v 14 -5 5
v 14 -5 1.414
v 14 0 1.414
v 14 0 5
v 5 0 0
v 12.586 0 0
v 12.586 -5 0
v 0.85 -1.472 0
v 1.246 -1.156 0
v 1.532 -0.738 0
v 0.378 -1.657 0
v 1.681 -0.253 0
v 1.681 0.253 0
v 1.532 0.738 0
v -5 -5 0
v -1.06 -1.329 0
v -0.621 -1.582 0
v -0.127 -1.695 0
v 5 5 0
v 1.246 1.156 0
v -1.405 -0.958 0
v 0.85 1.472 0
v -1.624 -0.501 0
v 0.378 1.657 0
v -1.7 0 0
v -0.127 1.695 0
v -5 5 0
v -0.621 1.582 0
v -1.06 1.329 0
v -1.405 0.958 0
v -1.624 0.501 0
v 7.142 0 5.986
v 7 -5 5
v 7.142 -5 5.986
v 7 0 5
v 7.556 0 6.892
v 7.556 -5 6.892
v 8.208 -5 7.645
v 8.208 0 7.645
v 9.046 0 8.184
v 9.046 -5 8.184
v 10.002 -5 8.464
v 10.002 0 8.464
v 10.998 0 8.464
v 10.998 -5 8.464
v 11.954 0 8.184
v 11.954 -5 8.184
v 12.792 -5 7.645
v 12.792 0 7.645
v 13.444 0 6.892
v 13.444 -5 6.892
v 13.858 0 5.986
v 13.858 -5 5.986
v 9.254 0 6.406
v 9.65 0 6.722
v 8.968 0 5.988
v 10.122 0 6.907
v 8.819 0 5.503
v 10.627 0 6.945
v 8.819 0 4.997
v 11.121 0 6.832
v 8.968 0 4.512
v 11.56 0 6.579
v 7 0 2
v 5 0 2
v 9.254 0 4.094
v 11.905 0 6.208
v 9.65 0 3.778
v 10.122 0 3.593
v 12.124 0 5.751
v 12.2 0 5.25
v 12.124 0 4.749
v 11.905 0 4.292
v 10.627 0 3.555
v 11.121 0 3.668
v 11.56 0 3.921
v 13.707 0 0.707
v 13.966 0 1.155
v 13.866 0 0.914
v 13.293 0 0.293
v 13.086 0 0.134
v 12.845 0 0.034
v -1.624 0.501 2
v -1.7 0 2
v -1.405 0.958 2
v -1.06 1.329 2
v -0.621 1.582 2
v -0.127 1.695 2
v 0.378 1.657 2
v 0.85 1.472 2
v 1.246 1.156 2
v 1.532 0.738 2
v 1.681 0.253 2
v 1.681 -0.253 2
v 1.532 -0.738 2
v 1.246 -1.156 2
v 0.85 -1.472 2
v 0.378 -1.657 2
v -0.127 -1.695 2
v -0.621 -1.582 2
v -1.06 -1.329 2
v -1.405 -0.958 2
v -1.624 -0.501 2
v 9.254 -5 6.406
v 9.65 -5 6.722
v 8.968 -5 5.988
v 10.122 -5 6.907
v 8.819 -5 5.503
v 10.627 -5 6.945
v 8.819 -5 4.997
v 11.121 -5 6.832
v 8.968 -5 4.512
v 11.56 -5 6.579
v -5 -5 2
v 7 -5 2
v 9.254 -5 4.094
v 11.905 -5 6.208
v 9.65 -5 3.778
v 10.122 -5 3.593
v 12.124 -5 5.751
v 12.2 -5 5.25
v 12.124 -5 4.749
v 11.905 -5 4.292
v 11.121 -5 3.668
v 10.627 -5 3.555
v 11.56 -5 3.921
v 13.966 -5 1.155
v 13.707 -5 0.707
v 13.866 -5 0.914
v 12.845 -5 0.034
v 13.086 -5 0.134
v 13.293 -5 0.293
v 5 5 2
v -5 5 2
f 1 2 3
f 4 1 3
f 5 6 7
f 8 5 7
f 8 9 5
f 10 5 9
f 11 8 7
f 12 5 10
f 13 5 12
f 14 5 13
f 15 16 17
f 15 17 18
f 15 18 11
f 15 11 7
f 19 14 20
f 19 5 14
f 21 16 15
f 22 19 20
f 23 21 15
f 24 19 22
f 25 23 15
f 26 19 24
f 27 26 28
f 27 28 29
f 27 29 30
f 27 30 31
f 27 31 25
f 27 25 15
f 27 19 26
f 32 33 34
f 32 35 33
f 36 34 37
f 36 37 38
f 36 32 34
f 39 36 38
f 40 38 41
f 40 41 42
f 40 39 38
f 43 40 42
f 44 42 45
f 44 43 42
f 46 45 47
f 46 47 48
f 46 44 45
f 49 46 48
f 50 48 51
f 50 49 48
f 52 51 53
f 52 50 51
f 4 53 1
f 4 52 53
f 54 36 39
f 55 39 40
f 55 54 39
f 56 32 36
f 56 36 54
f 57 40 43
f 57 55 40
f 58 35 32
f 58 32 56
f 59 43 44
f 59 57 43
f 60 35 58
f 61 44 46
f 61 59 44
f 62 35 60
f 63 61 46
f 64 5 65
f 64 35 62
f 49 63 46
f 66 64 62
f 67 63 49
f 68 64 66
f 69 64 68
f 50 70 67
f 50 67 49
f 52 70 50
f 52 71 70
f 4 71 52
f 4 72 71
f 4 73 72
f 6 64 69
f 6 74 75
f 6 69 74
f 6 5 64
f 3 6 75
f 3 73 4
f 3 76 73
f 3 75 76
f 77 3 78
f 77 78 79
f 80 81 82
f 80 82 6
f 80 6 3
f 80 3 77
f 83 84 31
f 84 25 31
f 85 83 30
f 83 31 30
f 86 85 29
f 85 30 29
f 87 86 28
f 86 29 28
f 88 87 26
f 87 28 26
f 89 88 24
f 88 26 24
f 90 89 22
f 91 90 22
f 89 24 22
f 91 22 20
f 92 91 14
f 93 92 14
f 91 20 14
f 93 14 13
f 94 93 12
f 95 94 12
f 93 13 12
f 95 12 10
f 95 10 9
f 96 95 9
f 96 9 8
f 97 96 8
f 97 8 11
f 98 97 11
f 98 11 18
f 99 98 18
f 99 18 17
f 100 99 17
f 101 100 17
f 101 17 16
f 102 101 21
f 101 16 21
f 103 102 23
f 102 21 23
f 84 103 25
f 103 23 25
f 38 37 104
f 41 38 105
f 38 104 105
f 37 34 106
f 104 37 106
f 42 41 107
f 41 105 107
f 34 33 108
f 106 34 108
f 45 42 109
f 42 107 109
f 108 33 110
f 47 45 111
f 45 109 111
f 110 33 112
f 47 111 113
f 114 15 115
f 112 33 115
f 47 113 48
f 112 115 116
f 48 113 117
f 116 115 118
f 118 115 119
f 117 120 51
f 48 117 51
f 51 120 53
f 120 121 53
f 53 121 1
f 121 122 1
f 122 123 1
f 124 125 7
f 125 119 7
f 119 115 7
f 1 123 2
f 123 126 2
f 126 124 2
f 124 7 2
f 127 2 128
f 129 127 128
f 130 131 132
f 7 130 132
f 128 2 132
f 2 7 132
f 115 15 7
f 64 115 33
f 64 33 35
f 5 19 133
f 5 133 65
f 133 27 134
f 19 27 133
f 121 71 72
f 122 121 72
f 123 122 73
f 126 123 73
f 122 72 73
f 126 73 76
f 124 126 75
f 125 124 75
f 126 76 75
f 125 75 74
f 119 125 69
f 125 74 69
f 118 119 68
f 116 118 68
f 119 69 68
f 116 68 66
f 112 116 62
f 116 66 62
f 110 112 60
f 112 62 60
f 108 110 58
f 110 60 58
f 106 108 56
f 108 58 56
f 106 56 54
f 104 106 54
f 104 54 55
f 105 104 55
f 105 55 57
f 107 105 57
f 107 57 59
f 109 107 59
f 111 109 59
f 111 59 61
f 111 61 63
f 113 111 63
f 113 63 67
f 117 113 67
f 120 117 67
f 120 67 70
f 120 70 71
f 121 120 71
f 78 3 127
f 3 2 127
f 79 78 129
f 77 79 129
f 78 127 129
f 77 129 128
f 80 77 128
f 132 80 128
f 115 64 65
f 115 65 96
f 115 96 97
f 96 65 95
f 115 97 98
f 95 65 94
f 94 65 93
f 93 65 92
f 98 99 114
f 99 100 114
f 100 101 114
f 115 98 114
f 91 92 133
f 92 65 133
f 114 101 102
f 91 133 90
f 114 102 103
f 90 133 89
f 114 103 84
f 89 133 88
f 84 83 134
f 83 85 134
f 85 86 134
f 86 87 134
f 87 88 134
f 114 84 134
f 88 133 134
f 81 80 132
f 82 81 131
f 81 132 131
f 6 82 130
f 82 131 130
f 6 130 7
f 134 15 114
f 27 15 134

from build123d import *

# Parameters (mm, degrees)
ESTRUSIONE_ESTRUSIONE1_DEPTH = 2
SCHIZZO2_W                   = 7
SCHIZZO2_H                   = 5
ESTRUSIONE_ESTRUSIONE2_DEPTH = 6.5
FORO_PER_VITE_M3_1_D         = 3.4
FORO_PER_VITE_M3_1_DEPTH     = 2
FORO_PER_VITE_M3_1_TIP       = 1.021463052
FORO_PER_VITE_M3_2_D         = 3.4
RACCORDO1_RADIUS             = 3.5
RACCORDO1_LENGTH             = 5
SMUSSO1_SIZE                 = 1
RACCORDO2_R                  = 1


with BuildPart() as part:
    # Schizzo1 → Estrusione-Estrusione1 (new body)
    with BuildSketch(Plane.XY):
        Polygon((5, 5), (5, 0), (14, 0), (14, -5), (5, -5), (-5, -5), (-5, 5), align=None)
    extrude(amount=ESTRUSIONE_ESTRUSIONE1_DEPTH)

    # Schizzo2 → Estrusione-Estrusione2 (add)
    with BuildSketch(Plane.XY.offset(2)):
        with Locations((10.5, -2.5)):
            Rectangle(SCHIZZO2_W, SCHIZZO2_H)
    extrude(amount=ESTRUSIONE_ESTRUSIONE2_DEPTH)

    # Foro per Vite M3-1
    with Locations(Plane.XY.offset(2)):
        with Locations((0, 0)):
            Hole(FORO_PER_VITE_M3_1_D / 2, depth=FORO_PER_VITE_M3_1_DEPTH)
            with Locations((0, 0, -(FORO_PER_VITE_M3_1_DEPTH + FORO_PER_VITE_M3_1_TIP / 2))):  # 118° drill point
                Cone(0, FORO_PER_VITE_M3_1_D / 2, FORO_PER_VITE_M3_1_TIP, mode=Mode.SUBTRACT)

    # Foro per Vite M3-2 (through all)
    with Locations(Plane(origin=(0, -5, 0), x_dir=(-1, 0, 0), z_dir=(0, -1, 0))):
        with Locations((-10.5, -5.25)):
            Hole(FORO_PER_VITE_M3_2_D / 2)

    # Raccordo1: full round fillet: the end face becomes a half cylinder, R = half its width
    raccordo1_face = Plane((10.5, -2.5, 8.5), x_dir=(0, 1, 0), z_dir=(0, 0, 1))  # on the end face: x along it, z out of the body
    raccordo1_slab = raccordo1_face.offset(-RACCORDO1_RADIUS / 2) * Box(RACCORDO1_LENGTH, 2 * RACCORDO1_RADIUS, RACCORDO1_RADIUS, mode=Mode.PRIVATE)  # the body's end, R deep
    raccordo1_round = Plane((10.5, -2.5, 5), x_dir=(0, 0, 1), z_dir=(0, 1, 0)) * Cylinder(RACCORDO1_RADIUS, RACCORDO1_LENGTH, mode=Mode.PRIVATE)  # its axis R under the face
    add(raccordo1_slab - raccordo1_round, mode=Mode.SUBTRACT)

    # Smusso1
    smusso1_edges = [part.edges().sort_by_distance(p)[0] for p in [
        (14, -2.5, 0),
    ]]
    chamfer(smusso1_edges, length=SMUSSO1_SIZE)

    # Raccordo2
    raccordo2_edges = [part.edges().sort_by_distance(p)[0] for p in [
        (14, -2.5, 1),
        (13, -2.5, 0),
    ]]
    fillet(raccordo2_edges, radius=RACCORDO2_R)


solid = part.part
